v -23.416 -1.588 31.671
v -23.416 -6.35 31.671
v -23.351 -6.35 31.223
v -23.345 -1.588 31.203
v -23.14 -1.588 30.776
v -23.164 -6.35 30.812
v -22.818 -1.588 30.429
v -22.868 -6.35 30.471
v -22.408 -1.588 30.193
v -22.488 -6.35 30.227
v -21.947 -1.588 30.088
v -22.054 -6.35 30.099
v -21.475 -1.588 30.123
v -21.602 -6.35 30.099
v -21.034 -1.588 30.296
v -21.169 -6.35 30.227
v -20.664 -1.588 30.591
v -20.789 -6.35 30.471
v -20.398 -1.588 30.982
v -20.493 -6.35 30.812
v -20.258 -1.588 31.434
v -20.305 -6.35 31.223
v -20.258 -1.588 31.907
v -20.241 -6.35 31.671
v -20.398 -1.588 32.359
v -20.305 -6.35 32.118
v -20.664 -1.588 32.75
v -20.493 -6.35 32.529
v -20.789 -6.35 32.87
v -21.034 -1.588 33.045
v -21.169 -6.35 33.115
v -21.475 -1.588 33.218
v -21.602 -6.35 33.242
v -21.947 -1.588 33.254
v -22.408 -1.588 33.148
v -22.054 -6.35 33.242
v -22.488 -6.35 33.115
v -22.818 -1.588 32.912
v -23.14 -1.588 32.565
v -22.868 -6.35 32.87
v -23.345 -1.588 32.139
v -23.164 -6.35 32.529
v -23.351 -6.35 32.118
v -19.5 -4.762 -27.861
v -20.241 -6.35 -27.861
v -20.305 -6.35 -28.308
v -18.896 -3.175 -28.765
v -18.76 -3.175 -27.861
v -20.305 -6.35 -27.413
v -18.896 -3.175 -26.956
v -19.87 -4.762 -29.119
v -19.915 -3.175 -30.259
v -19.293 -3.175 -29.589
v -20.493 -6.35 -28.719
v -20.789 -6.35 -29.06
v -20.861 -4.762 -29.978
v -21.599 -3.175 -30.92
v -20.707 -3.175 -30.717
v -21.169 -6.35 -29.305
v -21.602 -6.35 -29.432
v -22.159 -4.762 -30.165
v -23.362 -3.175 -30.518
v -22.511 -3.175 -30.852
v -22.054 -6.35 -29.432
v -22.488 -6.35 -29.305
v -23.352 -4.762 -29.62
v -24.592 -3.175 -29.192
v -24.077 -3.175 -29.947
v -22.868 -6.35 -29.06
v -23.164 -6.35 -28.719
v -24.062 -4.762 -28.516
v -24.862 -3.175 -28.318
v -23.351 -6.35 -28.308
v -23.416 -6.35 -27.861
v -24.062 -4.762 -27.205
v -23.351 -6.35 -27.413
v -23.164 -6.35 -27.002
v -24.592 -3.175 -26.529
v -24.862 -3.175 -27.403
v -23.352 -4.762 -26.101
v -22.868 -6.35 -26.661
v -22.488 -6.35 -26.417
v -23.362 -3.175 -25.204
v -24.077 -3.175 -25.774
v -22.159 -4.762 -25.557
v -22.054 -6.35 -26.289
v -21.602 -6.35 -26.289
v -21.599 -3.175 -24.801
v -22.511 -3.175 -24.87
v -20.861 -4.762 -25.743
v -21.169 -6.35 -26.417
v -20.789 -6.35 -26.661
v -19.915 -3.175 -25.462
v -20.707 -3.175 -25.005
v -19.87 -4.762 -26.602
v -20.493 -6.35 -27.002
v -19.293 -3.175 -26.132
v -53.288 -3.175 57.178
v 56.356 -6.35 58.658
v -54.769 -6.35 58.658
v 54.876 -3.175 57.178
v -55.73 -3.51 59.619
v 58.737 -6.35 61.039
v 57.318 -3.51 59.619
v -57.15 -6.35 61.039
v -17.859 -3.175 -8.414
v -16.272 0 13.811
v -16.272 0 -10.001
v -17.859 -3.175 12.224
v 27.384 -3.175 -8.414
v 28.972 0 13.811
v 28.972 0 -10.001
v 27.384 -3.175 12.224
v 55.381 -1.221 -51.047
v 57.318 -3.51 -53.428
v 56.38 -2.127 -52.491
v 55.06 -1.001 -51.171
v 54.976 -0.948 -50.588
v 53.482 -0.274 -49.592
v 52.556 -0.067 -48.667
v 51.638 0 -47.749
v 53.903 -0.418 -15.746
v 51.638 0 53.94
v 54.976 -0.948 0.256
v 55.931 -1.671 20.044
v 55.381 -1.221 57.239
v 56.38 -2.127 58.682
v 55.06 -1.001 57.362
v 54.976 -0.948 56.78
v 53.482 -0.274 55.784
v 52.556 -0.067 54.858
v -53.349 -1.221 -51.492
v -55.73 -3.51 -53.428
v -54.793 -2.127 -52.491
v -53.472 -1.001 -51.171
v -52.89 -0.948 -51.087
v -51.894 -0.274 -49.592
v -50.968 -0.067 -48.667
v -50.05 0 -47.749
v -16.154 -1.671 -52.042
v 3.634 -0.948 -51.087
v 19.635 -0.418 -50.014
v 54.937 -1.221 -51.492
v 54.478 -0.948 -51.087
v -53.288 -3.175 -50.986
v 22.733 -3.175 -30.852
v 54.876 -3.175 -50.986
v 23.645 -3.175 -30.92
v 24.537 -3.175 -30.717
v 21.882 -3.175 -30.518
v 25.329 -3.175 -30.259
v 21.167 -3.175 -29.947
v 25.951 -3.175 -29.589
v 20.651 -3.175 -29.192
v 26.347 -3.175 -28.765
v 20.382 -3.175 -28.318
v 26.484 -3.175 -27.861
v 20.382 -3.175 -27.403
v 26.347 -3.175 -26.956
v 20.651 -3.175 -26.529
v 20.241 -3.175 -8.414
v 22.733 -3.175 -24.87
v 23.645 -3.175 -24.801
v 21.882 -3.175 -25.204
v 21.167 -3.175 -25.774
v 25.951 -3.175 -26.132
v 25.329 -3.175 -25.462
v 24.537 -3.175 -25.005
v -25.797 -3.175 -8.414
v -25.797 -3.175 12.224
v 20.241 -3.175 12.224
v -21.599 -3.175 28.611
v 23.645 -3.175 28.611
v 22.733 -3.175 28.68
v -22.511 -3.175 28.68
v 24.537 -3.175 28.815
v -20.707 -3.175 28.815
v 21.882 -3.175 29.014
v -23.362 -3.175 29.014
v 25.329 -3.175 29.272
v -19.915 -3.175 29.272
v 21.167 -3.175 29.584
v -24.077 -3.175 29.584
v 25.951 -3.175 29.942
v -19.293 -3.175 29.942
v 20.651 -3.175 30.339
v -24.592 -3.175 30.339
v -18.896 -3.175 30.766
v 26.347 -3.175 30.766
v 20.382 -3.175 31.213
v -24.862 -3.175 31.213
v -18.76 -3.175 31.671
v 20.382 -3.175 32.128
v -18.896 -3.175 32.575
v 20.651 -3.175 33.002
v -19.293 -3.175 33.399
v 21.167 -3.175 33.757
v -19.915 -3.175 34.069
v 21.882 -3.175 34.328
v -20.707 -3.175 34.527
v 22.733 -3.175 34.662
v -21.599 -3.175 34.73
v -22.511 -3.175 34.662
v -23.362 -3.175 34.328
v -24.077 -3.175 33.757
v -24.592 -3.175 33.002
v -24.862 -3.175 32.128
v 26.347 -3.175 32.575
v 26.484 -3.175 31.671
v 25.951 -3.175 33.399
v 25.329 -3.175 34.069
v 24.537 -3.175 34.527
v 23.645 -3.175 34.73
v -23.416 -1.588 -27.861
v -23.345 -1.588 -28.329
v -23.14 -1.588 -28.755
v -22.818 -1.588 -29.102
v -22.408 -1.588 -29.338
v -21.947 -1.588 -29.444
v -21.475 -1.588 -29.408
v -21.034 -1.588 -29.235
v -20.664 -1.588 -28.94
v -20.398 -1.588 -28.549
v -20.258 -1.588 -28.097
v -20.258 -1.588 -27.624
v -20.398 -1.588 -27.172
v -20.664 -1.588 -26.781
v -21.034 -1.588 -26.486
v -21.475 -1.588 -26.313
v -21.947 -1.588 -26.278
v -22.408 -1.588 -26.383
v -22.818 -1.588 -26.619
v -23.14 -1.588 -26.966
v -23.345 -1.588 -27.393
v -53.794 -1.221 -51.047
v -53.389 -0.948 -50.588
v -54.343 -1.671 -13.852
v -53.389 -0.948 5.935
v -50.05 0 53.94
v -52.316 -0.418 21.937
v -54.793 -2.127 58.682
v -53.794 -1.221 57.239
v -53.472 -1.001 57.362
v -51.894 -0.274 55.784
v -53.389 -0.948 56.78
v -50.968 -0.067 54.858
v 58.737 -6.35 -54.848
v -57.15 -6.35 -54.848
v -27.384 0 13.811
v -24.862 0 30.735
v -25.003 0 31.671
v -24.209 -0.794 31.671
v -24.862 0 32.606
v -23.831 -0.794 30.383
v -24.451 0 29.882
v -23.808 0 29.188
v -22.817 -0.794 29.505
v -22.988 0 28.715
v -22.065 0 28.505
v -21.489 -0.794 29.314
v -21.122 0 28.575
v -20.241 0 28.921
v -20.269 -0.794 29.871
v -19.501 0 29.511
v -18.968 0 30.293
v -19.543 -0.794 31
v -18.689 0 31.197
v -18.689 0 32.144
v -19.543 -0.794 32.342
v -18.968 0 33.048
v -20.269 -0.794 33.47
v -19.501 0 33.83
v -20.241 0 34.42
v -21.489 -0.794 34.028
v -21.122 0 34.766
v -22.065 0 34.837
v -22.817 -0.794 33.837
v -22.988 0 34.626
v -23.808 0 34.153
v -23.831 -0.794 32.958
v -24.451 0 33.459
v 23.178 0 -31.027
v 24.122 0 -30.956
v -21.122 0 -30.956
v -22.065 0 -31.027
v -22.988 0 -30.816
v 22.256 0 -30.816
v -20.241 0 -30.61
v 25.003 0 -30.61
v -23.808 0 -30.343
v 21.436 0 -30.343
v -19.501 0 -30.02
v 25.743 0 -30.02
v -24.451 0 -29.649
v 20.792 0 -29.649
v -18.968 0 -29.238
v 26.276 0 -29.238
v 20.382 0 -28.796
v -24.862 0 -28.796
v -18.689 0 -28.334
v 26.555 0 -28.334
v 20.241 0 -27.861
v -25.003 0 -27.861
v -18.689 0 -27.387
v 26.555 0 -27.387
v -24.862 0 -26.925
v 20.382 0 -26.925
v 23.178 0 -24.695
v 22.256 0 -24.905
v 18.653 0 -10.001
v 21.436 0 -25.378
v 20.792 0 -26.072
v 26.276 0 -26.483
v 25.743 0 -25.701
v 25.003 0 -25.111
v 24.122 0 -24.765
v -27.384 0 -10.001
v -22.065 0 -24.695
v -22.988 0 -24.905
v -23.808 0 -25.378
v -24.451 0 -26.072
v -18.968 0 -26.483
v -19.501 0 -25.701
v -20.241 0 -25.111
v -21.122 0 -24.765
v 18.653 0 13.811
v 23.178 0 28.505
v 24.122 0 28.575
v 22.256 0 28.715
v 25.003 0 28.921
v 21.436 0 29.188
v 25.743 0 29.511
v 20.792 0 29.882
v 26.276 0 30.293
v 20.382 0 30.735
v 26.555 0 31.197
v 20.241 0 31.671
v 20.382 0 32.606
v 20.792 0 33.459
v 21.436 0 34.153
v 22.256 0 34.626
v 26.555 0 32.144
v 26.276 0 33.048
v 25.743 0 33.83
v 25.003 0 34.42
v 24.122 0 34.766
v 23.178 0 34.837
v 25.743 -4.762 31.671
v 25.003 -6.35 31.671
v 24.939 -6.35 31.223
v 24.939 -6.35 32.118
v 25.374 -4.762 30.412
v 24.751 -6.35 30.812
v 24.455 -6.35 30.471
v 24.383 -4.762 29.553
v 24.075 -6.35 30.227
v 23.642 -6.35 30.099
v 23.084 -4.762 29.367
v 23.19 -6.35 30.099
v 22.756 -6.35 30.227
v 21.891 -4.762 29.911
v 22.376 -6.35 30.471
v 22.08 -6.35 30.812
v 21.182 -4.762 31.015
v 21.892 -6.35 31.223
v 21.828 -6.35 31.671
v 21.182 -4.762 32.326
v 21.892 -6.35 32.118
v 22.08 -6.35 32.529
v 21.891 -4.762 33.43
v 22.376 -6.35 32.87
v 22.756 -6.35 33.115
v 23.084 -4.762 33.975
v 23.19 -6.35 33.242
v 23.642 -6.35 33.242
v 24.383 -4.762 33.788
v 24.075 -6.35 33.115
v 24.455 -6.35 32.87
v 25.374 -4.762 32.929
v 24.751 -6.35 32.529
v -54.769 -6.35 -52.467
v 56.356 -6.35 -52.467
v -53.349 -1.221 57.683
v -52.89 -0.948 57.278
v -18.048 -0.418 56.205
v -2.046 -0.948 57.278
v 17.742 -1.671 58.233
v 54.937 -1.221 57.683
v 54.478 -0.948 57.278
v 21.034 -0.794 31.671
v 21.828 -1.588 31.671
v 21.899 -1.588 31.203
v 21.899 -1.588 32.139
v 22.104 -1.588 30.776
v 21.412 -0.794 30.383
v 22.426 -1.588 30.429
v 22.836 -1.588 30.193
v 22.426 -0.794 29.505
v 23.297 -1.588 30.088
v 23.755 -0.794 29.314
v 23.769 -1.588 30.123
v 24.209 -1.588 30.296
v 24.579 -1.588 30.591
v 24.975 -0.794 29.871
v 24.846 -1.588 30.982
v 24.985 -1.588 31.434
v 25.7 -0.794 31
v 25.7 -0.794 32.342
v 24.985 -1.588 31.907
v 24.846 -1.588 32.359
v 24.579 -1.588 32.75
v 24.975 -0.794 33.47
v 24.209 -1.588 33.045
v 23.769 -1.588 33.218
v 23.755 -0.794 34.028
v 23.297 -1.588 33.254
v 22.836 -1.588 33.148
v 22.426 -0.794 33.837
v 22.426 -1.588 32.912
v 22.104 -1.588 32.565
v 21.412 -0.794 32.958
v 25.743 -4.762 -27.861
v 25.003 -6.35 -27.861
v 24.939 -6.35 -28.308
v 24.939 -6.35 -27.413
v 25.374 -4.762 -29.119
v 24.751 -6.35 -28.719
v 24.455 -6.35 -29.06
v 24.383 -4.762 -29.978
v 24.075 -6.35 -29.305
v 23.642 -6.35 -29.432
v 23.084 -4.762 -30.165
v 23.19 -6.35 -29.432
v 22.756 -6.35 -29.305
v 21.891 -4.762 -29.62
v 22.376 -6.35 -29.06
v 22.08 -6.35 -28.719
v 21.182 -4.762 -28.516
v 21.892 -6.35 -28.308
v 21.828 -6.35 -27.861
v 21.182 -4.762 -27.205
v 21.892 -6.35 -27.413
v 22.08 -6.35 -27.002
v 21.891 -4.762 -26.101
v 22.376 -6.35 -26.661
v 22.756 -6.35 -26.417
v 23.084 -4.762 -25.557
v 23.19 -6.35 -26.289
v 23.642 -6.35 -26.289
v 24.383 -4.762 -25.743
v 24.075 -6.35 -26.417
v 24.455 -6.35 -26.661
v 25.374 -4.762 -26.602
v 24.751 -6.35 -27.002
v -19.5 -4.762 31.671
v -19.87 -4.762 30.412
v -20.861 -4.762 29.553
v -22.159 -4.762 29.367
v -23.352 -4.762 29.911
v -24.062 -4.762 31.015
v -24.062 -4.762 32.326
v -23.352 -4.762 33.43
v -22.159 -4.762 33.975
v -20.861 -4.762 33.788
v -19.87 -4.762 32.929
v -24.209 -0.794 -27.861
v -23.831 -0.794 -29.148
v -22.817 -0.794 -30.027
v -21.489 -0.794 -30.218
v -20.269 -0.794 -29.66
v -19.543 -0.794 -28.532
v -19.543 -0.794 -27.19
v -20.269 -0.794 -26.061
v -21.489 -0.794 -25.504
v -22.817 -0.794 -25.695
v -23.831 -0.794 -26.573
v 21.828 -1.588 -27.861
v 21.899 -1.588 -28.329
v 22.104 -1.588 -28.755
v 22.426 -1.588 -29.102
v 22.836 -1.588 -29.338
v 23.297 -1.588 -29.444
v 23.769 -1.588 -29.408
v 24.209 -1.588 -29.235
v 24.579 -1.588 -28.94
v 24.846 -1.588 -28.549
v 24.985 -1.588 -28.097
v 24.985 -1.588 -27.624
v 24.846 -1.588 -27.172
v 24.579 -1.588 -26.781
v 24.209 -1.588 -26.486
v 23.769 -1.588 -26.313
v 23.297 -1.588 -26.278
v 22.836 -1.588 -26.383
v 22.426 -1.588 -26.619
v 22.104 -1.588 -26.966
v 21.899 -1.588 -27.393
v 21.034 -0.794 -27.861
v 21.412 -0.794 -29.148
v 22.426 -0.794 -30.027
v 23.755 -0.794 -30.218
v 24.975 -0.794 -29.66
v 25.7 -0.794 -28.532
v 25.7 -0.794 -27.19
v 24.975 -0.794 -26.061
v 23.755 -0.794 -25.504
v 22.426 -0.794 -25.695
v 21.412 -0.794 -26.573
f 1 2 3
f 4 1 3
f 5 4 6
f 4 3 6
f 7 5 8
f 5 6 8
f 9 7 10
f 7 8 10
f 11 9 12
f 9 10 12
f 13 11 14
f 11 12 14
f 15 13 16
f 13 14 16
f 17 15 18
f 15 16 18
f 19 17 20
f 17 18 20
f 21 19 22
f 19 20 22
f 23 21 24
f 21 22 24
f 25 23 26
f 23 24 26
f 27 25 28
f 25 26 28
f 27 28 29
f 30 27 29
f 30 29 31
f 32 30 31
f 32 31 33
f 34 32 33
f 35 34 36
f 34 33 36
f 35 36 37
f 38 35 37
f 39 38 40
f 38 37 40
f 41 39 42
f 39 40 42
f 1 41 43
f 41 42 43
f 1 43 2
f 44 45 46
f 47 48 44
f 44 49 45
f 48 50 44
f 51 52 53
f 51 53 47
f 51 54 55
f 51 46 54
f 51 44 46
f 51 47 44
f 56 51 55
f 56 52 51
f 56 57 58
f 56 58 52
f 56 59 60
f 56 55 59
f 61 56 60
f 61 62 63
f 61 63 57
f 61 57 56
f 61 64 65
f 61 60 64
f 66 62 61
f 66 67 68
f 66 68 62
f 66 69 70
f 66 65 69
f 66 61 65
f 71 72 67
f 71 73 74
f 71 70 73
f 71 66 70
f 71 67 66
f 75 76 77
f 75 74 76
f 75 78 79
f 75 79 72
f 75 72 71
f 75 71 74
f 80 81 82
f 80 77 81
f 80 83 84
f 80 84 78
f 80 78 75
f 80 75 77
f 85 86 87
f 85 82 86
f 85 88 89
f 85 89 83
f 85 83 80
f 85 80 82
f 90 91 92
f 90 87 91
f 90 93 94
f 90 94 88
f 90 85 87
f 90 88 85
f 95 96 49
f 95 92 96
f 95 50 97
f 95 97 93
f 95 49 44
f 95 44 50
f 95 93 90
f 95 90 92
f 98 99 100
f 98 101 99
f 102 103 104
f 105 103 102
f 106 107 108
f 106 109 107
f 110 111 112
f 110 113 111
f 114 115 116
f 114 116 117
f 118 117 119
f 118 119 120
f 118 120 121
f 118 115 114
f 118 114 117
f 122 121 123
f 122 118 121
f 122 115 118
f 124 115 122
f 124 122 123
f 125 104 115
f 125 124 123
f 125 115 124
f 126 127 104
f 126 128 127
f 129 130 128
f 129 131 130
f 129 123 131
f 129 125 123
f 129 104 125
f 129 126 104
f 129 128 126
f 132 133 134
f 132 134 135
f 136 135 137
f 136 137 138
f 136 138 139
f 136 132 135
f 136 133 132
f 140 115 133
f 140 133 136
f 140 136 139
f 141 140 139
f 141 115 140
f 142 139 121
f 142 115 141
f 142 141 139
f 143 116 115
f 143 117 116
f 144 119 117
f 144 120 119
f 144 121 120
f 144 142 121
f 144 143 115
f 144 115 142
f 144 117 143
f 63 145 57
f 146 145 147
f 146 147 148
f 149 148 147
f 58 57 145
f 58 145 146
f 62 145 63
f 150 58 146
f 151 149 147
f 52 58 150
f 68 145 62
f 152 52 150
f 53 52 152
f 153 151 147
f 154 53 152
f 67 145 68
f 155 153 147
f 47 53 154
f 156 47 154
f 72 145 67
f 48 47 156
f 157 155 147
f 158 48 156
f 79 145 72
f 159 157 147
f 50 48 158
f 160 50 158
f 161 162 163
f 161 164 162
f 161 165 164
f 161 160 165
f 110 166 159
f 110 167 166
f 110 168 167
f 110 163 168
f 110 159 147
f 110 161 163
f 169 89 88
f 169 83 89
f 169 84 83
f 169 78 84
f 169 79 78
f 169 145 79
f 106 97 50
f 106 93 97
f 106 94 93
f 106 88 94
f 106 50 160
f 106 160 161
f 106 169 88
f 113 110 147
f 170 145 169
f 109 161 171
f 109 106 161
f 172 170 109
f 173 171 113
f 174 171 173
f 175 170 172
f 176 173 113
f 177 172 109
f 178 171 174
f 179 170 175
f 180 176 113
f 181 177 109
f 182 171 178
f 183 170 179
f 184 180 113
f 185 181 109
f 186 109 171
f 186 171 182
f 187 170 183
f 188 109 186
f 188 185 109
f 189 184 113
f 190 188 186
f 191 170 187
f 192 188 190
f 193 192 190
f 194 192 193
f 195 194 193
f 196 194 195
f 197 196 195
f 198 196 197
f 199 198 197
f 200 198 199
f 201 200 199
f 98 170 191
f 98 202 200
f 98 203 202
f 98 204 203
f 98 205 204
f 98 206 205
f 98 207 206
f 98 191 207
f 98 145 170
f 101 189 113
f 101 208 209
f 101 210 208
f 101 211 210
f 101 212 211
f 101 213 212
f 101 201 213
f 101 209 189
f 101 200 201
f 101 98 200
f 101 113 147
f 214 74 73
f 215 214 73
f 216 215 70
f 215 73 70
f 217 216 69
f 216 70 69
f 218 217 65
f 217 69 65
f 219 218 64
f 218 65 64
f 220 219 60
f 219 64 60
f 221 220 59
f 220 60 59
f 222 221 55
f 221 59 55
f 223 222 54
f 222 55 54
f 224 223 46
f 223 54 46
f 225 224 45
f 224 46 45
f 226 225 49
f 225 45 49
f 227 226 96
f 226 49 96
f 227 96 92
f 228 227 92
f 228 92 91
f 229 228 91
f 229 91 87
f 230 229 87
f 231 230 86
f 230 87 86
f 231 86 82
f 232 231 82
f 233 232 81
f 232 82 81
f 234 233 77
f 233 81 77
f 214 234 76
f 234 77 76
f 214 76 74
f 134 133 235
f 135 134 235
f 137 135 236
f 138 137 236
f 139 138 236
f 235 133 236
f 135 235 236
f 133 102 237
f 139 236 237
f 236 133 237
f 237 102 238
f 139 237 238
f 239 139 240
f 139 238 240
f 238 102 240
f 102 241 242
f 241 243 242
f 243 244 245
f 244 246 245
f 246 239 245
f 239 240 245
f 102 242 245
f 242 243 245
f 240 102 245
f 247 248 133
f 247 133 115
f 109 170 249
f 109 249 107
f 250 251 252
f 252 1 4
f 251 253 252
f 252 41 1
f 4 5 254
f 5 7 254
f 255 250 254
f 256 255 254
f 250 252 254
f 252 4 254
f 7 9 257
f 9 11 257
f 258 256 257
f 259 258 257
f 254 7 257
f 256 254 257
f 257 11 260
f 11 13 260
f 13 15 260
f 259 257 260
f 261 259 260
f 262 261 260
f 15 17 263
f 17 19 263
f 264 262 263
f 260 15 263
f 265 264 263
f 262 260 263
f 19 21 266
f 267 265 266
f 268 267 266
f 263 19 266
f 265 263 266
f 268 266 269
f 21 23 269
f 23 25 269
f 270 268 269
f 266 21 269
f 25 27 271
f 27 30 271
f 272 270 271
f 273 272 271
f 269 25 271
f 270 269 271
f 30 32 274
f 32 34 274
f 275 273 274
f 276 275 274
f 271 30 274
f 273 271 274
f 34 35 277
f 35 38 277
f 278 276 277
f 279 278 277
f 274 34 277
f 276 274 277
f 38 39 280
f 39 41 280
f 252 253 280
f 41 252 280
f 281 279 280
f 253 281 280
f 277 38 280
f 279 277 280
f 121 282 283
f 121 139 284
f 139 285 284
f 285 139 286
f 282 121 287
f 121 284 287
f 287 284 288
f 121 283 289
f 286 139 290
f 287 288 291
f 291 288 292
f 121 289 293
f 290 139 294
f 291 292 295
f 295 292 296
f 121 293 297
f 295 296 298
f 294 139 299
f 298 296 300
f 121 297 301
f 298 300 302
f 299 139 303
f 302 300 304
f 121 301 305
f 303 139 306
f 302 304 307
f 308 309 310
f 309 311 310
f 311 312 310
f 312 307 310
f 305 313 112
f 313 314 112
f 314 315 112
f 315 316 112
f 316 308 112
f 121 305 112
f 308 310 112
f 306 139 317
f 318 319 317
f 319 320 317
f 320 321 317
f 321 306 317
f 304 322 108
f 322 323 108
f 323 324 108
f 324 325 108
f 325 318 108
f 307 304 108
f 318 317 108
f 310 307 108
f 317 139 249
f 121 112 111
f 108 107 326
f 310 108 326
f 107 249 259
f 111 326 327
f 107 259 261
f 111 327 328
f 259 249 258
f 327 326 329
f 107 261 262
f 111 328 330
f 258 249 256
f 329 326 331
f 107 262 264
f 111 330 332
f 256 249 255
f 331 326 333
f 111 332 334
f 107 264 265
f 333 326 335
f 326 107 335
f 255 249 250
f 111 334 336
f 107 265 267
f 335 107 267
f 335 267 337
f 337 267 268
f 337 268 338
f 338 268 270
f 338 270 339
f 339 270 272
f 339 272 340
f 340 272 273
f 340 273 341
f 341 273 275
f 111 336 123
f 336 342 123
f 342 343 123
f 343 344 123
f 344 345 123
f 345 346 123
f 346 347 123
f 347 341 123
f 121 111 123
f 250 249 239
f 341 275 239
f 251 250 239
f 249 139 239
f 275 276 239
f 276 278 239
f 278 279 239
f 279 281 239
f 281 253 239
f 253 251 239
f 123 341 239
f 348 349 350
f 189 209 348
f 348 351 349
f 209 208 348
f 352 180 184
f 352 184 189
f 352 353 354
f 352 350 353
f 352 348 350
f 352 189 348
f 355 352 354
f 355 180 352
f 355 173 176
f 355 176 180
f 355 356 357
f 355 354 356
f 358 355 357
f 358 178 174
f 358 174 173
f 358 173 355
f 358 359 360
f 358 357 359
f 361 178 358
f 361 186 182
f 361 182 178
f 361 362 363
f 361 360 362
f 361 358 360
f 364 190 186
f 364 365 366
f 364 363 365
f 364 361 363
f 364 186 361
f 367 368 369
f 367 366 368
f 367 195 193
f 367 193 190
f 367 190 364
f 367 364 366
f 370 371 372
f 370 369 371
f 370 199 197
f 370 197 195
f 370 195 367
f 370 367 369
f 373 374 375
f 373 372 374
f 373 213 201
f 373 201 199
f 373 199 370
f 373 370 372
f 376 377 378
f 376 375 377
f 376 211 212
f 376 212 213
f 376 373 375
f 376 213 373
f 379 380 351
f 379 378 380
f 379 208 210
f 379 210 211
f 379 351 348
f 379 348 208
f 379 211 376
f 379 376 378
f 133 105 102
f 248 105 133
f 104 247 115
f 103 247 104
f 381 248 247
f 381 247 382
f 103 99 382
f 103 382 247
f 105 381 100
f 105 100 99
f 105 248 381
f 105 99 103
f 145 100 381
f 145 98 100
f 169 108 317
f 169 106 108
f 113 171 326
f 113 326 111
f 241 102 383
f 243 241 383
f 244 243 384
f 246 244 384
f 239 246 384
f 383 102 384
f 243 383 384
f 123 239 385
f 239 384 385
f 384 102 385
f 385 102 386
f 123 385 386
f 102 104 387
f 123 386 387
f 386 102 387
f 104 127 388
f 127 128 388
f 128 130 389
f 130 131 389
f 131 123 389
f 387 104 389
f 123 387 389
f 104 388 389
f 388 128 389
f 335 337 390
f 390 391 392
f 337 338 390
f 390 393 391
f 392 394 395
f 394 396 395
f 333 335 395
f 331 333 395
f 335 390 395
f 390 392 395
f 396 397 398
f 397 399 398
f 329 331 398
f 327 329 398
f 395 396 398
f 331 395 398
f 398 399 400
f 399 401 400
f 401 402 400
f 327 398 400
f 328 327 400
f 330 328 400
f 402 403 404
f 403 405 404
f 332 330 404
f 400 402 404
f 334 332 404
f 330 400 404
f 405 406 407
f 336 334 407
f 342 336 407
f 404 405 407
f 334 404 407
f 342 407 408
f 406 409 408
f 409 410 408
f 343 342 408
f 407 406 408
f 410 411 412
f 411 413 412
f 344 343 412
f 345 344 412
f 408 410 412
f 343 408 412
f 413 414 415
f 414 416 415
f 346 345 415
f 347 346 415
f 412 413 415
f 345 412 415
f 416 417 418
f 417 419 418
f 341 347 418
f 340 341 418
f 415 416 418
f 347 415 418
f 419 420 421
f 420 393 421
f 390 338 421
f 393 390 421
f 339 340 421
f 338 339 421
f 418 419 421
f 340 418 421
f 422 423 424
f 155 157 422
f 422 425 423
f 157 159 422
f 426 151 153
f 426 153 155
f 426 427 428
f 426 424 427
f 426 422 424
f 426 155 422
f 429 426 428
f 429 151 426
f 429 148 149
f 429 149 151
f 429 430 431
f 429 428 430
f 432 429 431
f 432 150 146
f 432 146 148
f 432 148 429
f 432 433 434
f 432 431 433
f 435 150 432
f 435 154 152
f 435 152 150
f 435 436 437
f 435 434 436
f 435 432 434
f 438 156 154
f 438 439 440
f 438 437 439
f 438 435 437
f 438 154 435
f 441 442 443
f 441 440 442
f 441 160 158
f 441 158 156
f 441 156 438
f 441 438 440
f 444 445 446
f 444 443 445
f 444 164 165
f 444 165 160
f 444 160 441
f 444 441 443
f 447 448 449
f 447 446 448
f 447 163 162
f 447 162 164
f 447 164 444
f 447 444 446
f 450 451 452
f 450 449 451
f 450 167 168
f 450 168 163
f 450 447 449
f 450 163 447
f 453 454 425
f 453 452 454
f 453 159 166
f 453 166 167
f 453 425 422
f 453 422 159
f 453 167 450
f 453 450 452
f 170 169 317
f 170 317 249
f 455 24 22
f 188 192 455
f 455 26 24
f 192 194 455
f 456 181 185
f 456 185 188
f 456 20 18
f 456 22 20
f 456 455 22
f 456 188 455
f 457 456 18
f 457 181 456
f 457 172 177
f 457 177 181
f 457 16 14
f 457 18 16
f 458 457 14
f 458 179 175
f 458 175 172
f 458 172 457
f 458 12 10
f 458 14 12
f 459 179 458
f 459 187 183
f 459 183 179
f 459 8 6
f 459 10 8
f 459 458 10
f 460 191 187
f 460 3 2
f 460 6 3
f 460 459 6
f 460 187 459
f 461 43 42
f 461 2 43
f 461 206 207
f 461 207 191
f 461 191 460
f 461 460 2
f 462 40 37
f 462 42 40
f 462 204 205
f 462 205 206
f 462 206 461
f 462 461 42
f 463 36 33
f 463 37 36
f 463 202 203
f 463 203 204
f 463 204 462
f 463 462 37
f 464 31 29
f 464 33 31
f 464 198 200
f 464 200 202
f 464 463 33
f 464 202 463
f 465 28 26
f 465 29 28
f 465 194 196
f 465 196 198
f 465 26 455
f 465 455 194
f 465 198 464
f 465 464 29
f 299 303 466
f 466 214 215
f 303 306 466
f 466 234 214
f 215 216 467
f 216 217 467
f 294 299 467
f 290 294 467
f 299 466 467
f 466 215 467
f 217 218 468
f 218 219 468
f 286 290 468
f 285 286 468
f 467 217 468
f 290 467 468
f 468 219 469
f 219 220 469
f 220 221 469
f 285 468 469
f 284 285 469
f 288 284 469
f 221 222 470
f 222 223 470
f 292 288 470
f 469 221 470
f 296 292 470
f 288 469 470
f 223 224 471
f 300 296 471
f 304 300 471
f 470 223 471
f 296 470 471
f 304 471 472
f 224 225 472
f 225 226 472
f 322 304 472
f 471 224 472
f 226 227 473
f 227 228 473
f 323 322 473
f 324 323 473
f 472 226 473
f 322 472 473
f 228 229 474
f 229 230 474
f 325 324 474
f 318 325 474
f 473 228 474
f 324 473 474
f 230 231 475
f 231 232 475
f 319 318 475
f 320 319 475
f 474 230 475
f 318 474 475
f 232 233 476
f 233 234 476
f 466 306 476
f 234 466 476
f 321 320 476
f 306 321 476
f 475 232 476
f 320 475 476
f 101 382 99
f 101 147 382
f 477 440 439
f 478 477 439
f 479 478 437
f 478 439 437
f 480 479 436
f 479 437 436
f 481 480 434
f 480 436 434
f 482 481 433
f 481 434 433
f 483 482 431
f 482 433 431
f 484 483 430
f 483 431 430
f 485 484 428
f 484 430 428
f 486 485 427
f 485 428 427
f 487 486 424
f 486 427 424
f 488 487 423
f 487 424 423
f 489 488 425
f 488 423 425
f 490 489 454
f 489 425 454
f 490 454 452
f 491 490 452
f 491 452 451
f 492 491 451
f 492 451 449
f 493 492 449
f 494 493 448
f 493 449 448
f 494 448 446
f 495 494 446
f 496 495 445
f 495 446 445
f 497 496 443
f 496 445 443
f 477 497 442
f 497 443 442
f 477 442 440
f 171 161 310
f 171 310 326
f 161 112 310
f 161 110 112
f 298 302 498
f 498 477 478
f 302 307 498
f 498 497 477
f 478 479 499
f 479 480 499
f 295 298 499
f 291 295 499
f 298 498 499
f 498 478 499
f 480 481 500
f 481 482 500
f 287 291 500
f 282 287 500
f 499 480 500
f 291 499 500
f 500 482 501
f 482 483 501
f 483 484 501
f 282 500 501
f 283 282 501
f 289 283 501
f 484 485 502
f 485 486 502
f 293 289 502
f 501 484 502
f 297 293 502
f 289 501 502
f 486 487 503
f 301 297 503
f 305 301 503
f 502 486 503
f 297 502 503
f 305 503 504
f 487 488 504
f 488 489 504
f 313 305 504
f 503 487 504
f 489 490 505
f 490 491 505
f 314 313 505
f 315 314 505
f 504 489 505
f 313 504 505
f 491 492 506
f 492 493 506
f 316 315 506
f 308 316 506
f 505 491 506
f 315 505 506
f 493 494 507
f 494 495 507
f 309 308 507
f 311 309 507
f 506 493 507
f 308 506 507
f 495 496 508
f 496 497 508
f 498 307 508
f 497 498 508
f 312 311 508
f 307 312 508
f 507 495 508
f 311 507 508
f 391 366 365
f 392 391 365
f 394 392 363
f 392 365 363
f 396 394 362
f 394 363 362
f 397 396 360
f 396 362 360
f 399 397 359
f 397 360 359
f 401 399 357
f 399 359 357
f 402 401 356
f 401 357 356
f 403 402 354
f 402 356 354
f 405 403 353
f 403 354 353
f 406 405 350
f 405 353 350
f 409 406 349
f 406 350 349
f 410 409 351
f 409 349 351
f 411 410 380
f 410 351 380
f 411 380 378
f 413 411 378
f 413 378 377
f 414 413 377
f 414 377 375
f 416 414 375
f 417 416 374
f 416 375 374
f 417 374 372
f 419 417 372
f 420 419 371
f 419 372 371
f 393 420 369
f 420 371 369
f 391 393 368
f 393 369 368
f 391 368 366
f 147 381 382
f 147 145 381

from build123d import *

# Parameters (mm, degrees)
F0_W           = 109.5375
F0_H           = 109.5375
F0_W_2         = 11.1125
F0_H_2         = 23.8125
F0_W_3         = 10.31875
F1_DEPTH       = 6.35
F1_TAPER       = -26.565
F2_D           = 3.175
F2_DEPTH       = 9.525
F2_CSINK_D     = 6.35
F2_CSINK_ANGLE = 90
F2_TIP         = 0.9538662327
F3_D           = 3.175
F3_DEPTH       = 9.525
F3_CSINK_D     = 6.35
F3_CSINK_ANGLE = 90
F3_TIP         = 0.9538662327
F4_D           = 3.175
F4_DEPTH       = 9.525
F4_CSINK_D     = 6.35
F4_CSINK_ANGLE = 90
F4_TIP         = 0.9538662327
F5_D           = 3.175
F5_DEPTH       = 9.525
F5_CSINK_D     = 6.35
F5_CSINK_ANGLE = 90
F5_TIP         = 0.9538662327
F6_R           = 6.35
F7_W           = 111.125
F7_H           = 111.125
F7_R           = 1.5875
F7_W_2         = 4.7625141797
F7_H_2         = 17.4625141797
F7_W_3         = 3.9687641797
F8_DEPTH       = 3.175
F8_TAPER       = 25


with BuildPart() as f1:
    # F0 (on Front) → F1 (new body)
    with BuildSketch(Plane.XZ):
        with Locations((0.79375, 3.095625)):
            Rectangle(F0_W, F0_H)
        with Locations((-21.828125, 1.905)):
            Rectangle(F0_W_2, F0_H_2, mode=Mode.SUBTRACT)
        with Locations((23.8125, 1.905)):
            Rectangle(F0_W_3, F0_H_2, mode=Mode.SUBTRACT)
    extrude(amount=F1_DEPTH, taper=F1_TAPER)

    # F2
    with Locations(Plane(origin=(0, 0, 0), x_dir=(1, 0, 0), z_dir=(0, 1, 0))):
        with Locations((-21.828125, -31.670625)):
            CounterSinkHole(F2_D / 2, F2_CSINK_D / 2, depth=F2_DEPTH, counter_sink_angle=F2_CSINK_ANGLE)
            with Locations((0, 0, -(F2_DEPTH + F2_TIP / 2))):  # 118° drill point
                Cone(0, F2_D / 2, F2_TIP, mode=Mode.SUBTRACT)

    # F3
    with Locations(Plane(origin=(0, 0, 0), x_dir=(1, 0, 0), z_dir=(0, 1, 0))):
        with Locations((23.415625, -31.670625)):
            CounterSinkHole(F3_D / 2, F3_CSINK_D / 2, depth=F3_DEPTH, counter_sink_angle=F3_CSINK_ANGLE)
            with Locations((0, 0, -(F3_DEPTH + F3_TIP / 2))):  # 118° drill point
                Cone(0, F3_D / 2, F3_TIP, mode=Mode.SUBTRACT)

    # F4
    with Locations(Plane(origin=(0, 0, 0), x_dir=(1, 0, 0), z_dir=(0, 1, 0))):
        with Locations((23.415625, 27.860625)):
            CounterSinkHole(F4_D / 2, F4_CSINK_D / 2, depth=F4_DEPTH, counter_sink_angle=F4_CSINK_ANGLE)
            with Locations((0, 0, -(F4_DEPTH + F4_TIP / 2))):  # 118° drill point
                Cone(0, F4_D / 2, F4_TIP, mode=Mode.SUBTRACT)

    # F5
    with Locations(Plane(origin=(0, 0, 0), x_dir=(1, 0, 0), z_dir=(0, 1, 0))):
        with Locations((-21.828125, 27.860625)):
            CounterSinkHole(F5_D / 2, F5_CSINK_D / 2, depth=F5_DEPTH, counter_sink_angle=F5_CSINK_ANGLE)
            with Locations((0, 0, -(F5_DEPTH + F5_TIP / 2))):  # 118° drill point
                Cone(0, F5_D / 2, F5_TIP, mode=Mode.SUBTRACT)

    # F6
    f6_edges = [f1.edges().sort_by_distance(p)[0] for p in [
        (0.79375, 0, 57.864375),
        (55.5625, 0, 3.095625),
        (-53.975, 0, 3.095625),
        (0.79375, 0, -51.673125),
    ]]
    fillet(f6_edges, radius=F6_R)

    # F7 (on face) → F8 (cut)
    with BuildSketch(Plane.XZ.offset(6.35)):
        with Locations((0.79375, 3.095625)):
            Rectangle(F7_W, F7_H)
        with Locations((-21.828125, -27.860625)):
            Circle(F7_R, mode=Mode.SUBTRACT)
        with Locations((-21.828125, 1.905)):
            Rectangle(F7_W_2, F7_H_2, mode=Mode.SUBTRACT)
        with Locations((23.415625, -27.860625)):
            Circle(F7_R, mode=Mode.SUBTRACT)
        with Locations((23.8125, 1.905)):
            Rectangle(F7_W_3, F7_H_2, mode=Mode.SUBTRACT)
        with Locations((-21.828125, 31.670625)):
            Circle(F7_R, mode=Mode.SUBTRACT)
        with Locations((23.415625, 31.670625)):
            Circle(F7_R, mode=Mode.SUBTRACT)
    extrude(amount=-F8_DEPTH, taper=F8_TAPER, mode=Mode.SUBTRACT)


solid = f1.part
